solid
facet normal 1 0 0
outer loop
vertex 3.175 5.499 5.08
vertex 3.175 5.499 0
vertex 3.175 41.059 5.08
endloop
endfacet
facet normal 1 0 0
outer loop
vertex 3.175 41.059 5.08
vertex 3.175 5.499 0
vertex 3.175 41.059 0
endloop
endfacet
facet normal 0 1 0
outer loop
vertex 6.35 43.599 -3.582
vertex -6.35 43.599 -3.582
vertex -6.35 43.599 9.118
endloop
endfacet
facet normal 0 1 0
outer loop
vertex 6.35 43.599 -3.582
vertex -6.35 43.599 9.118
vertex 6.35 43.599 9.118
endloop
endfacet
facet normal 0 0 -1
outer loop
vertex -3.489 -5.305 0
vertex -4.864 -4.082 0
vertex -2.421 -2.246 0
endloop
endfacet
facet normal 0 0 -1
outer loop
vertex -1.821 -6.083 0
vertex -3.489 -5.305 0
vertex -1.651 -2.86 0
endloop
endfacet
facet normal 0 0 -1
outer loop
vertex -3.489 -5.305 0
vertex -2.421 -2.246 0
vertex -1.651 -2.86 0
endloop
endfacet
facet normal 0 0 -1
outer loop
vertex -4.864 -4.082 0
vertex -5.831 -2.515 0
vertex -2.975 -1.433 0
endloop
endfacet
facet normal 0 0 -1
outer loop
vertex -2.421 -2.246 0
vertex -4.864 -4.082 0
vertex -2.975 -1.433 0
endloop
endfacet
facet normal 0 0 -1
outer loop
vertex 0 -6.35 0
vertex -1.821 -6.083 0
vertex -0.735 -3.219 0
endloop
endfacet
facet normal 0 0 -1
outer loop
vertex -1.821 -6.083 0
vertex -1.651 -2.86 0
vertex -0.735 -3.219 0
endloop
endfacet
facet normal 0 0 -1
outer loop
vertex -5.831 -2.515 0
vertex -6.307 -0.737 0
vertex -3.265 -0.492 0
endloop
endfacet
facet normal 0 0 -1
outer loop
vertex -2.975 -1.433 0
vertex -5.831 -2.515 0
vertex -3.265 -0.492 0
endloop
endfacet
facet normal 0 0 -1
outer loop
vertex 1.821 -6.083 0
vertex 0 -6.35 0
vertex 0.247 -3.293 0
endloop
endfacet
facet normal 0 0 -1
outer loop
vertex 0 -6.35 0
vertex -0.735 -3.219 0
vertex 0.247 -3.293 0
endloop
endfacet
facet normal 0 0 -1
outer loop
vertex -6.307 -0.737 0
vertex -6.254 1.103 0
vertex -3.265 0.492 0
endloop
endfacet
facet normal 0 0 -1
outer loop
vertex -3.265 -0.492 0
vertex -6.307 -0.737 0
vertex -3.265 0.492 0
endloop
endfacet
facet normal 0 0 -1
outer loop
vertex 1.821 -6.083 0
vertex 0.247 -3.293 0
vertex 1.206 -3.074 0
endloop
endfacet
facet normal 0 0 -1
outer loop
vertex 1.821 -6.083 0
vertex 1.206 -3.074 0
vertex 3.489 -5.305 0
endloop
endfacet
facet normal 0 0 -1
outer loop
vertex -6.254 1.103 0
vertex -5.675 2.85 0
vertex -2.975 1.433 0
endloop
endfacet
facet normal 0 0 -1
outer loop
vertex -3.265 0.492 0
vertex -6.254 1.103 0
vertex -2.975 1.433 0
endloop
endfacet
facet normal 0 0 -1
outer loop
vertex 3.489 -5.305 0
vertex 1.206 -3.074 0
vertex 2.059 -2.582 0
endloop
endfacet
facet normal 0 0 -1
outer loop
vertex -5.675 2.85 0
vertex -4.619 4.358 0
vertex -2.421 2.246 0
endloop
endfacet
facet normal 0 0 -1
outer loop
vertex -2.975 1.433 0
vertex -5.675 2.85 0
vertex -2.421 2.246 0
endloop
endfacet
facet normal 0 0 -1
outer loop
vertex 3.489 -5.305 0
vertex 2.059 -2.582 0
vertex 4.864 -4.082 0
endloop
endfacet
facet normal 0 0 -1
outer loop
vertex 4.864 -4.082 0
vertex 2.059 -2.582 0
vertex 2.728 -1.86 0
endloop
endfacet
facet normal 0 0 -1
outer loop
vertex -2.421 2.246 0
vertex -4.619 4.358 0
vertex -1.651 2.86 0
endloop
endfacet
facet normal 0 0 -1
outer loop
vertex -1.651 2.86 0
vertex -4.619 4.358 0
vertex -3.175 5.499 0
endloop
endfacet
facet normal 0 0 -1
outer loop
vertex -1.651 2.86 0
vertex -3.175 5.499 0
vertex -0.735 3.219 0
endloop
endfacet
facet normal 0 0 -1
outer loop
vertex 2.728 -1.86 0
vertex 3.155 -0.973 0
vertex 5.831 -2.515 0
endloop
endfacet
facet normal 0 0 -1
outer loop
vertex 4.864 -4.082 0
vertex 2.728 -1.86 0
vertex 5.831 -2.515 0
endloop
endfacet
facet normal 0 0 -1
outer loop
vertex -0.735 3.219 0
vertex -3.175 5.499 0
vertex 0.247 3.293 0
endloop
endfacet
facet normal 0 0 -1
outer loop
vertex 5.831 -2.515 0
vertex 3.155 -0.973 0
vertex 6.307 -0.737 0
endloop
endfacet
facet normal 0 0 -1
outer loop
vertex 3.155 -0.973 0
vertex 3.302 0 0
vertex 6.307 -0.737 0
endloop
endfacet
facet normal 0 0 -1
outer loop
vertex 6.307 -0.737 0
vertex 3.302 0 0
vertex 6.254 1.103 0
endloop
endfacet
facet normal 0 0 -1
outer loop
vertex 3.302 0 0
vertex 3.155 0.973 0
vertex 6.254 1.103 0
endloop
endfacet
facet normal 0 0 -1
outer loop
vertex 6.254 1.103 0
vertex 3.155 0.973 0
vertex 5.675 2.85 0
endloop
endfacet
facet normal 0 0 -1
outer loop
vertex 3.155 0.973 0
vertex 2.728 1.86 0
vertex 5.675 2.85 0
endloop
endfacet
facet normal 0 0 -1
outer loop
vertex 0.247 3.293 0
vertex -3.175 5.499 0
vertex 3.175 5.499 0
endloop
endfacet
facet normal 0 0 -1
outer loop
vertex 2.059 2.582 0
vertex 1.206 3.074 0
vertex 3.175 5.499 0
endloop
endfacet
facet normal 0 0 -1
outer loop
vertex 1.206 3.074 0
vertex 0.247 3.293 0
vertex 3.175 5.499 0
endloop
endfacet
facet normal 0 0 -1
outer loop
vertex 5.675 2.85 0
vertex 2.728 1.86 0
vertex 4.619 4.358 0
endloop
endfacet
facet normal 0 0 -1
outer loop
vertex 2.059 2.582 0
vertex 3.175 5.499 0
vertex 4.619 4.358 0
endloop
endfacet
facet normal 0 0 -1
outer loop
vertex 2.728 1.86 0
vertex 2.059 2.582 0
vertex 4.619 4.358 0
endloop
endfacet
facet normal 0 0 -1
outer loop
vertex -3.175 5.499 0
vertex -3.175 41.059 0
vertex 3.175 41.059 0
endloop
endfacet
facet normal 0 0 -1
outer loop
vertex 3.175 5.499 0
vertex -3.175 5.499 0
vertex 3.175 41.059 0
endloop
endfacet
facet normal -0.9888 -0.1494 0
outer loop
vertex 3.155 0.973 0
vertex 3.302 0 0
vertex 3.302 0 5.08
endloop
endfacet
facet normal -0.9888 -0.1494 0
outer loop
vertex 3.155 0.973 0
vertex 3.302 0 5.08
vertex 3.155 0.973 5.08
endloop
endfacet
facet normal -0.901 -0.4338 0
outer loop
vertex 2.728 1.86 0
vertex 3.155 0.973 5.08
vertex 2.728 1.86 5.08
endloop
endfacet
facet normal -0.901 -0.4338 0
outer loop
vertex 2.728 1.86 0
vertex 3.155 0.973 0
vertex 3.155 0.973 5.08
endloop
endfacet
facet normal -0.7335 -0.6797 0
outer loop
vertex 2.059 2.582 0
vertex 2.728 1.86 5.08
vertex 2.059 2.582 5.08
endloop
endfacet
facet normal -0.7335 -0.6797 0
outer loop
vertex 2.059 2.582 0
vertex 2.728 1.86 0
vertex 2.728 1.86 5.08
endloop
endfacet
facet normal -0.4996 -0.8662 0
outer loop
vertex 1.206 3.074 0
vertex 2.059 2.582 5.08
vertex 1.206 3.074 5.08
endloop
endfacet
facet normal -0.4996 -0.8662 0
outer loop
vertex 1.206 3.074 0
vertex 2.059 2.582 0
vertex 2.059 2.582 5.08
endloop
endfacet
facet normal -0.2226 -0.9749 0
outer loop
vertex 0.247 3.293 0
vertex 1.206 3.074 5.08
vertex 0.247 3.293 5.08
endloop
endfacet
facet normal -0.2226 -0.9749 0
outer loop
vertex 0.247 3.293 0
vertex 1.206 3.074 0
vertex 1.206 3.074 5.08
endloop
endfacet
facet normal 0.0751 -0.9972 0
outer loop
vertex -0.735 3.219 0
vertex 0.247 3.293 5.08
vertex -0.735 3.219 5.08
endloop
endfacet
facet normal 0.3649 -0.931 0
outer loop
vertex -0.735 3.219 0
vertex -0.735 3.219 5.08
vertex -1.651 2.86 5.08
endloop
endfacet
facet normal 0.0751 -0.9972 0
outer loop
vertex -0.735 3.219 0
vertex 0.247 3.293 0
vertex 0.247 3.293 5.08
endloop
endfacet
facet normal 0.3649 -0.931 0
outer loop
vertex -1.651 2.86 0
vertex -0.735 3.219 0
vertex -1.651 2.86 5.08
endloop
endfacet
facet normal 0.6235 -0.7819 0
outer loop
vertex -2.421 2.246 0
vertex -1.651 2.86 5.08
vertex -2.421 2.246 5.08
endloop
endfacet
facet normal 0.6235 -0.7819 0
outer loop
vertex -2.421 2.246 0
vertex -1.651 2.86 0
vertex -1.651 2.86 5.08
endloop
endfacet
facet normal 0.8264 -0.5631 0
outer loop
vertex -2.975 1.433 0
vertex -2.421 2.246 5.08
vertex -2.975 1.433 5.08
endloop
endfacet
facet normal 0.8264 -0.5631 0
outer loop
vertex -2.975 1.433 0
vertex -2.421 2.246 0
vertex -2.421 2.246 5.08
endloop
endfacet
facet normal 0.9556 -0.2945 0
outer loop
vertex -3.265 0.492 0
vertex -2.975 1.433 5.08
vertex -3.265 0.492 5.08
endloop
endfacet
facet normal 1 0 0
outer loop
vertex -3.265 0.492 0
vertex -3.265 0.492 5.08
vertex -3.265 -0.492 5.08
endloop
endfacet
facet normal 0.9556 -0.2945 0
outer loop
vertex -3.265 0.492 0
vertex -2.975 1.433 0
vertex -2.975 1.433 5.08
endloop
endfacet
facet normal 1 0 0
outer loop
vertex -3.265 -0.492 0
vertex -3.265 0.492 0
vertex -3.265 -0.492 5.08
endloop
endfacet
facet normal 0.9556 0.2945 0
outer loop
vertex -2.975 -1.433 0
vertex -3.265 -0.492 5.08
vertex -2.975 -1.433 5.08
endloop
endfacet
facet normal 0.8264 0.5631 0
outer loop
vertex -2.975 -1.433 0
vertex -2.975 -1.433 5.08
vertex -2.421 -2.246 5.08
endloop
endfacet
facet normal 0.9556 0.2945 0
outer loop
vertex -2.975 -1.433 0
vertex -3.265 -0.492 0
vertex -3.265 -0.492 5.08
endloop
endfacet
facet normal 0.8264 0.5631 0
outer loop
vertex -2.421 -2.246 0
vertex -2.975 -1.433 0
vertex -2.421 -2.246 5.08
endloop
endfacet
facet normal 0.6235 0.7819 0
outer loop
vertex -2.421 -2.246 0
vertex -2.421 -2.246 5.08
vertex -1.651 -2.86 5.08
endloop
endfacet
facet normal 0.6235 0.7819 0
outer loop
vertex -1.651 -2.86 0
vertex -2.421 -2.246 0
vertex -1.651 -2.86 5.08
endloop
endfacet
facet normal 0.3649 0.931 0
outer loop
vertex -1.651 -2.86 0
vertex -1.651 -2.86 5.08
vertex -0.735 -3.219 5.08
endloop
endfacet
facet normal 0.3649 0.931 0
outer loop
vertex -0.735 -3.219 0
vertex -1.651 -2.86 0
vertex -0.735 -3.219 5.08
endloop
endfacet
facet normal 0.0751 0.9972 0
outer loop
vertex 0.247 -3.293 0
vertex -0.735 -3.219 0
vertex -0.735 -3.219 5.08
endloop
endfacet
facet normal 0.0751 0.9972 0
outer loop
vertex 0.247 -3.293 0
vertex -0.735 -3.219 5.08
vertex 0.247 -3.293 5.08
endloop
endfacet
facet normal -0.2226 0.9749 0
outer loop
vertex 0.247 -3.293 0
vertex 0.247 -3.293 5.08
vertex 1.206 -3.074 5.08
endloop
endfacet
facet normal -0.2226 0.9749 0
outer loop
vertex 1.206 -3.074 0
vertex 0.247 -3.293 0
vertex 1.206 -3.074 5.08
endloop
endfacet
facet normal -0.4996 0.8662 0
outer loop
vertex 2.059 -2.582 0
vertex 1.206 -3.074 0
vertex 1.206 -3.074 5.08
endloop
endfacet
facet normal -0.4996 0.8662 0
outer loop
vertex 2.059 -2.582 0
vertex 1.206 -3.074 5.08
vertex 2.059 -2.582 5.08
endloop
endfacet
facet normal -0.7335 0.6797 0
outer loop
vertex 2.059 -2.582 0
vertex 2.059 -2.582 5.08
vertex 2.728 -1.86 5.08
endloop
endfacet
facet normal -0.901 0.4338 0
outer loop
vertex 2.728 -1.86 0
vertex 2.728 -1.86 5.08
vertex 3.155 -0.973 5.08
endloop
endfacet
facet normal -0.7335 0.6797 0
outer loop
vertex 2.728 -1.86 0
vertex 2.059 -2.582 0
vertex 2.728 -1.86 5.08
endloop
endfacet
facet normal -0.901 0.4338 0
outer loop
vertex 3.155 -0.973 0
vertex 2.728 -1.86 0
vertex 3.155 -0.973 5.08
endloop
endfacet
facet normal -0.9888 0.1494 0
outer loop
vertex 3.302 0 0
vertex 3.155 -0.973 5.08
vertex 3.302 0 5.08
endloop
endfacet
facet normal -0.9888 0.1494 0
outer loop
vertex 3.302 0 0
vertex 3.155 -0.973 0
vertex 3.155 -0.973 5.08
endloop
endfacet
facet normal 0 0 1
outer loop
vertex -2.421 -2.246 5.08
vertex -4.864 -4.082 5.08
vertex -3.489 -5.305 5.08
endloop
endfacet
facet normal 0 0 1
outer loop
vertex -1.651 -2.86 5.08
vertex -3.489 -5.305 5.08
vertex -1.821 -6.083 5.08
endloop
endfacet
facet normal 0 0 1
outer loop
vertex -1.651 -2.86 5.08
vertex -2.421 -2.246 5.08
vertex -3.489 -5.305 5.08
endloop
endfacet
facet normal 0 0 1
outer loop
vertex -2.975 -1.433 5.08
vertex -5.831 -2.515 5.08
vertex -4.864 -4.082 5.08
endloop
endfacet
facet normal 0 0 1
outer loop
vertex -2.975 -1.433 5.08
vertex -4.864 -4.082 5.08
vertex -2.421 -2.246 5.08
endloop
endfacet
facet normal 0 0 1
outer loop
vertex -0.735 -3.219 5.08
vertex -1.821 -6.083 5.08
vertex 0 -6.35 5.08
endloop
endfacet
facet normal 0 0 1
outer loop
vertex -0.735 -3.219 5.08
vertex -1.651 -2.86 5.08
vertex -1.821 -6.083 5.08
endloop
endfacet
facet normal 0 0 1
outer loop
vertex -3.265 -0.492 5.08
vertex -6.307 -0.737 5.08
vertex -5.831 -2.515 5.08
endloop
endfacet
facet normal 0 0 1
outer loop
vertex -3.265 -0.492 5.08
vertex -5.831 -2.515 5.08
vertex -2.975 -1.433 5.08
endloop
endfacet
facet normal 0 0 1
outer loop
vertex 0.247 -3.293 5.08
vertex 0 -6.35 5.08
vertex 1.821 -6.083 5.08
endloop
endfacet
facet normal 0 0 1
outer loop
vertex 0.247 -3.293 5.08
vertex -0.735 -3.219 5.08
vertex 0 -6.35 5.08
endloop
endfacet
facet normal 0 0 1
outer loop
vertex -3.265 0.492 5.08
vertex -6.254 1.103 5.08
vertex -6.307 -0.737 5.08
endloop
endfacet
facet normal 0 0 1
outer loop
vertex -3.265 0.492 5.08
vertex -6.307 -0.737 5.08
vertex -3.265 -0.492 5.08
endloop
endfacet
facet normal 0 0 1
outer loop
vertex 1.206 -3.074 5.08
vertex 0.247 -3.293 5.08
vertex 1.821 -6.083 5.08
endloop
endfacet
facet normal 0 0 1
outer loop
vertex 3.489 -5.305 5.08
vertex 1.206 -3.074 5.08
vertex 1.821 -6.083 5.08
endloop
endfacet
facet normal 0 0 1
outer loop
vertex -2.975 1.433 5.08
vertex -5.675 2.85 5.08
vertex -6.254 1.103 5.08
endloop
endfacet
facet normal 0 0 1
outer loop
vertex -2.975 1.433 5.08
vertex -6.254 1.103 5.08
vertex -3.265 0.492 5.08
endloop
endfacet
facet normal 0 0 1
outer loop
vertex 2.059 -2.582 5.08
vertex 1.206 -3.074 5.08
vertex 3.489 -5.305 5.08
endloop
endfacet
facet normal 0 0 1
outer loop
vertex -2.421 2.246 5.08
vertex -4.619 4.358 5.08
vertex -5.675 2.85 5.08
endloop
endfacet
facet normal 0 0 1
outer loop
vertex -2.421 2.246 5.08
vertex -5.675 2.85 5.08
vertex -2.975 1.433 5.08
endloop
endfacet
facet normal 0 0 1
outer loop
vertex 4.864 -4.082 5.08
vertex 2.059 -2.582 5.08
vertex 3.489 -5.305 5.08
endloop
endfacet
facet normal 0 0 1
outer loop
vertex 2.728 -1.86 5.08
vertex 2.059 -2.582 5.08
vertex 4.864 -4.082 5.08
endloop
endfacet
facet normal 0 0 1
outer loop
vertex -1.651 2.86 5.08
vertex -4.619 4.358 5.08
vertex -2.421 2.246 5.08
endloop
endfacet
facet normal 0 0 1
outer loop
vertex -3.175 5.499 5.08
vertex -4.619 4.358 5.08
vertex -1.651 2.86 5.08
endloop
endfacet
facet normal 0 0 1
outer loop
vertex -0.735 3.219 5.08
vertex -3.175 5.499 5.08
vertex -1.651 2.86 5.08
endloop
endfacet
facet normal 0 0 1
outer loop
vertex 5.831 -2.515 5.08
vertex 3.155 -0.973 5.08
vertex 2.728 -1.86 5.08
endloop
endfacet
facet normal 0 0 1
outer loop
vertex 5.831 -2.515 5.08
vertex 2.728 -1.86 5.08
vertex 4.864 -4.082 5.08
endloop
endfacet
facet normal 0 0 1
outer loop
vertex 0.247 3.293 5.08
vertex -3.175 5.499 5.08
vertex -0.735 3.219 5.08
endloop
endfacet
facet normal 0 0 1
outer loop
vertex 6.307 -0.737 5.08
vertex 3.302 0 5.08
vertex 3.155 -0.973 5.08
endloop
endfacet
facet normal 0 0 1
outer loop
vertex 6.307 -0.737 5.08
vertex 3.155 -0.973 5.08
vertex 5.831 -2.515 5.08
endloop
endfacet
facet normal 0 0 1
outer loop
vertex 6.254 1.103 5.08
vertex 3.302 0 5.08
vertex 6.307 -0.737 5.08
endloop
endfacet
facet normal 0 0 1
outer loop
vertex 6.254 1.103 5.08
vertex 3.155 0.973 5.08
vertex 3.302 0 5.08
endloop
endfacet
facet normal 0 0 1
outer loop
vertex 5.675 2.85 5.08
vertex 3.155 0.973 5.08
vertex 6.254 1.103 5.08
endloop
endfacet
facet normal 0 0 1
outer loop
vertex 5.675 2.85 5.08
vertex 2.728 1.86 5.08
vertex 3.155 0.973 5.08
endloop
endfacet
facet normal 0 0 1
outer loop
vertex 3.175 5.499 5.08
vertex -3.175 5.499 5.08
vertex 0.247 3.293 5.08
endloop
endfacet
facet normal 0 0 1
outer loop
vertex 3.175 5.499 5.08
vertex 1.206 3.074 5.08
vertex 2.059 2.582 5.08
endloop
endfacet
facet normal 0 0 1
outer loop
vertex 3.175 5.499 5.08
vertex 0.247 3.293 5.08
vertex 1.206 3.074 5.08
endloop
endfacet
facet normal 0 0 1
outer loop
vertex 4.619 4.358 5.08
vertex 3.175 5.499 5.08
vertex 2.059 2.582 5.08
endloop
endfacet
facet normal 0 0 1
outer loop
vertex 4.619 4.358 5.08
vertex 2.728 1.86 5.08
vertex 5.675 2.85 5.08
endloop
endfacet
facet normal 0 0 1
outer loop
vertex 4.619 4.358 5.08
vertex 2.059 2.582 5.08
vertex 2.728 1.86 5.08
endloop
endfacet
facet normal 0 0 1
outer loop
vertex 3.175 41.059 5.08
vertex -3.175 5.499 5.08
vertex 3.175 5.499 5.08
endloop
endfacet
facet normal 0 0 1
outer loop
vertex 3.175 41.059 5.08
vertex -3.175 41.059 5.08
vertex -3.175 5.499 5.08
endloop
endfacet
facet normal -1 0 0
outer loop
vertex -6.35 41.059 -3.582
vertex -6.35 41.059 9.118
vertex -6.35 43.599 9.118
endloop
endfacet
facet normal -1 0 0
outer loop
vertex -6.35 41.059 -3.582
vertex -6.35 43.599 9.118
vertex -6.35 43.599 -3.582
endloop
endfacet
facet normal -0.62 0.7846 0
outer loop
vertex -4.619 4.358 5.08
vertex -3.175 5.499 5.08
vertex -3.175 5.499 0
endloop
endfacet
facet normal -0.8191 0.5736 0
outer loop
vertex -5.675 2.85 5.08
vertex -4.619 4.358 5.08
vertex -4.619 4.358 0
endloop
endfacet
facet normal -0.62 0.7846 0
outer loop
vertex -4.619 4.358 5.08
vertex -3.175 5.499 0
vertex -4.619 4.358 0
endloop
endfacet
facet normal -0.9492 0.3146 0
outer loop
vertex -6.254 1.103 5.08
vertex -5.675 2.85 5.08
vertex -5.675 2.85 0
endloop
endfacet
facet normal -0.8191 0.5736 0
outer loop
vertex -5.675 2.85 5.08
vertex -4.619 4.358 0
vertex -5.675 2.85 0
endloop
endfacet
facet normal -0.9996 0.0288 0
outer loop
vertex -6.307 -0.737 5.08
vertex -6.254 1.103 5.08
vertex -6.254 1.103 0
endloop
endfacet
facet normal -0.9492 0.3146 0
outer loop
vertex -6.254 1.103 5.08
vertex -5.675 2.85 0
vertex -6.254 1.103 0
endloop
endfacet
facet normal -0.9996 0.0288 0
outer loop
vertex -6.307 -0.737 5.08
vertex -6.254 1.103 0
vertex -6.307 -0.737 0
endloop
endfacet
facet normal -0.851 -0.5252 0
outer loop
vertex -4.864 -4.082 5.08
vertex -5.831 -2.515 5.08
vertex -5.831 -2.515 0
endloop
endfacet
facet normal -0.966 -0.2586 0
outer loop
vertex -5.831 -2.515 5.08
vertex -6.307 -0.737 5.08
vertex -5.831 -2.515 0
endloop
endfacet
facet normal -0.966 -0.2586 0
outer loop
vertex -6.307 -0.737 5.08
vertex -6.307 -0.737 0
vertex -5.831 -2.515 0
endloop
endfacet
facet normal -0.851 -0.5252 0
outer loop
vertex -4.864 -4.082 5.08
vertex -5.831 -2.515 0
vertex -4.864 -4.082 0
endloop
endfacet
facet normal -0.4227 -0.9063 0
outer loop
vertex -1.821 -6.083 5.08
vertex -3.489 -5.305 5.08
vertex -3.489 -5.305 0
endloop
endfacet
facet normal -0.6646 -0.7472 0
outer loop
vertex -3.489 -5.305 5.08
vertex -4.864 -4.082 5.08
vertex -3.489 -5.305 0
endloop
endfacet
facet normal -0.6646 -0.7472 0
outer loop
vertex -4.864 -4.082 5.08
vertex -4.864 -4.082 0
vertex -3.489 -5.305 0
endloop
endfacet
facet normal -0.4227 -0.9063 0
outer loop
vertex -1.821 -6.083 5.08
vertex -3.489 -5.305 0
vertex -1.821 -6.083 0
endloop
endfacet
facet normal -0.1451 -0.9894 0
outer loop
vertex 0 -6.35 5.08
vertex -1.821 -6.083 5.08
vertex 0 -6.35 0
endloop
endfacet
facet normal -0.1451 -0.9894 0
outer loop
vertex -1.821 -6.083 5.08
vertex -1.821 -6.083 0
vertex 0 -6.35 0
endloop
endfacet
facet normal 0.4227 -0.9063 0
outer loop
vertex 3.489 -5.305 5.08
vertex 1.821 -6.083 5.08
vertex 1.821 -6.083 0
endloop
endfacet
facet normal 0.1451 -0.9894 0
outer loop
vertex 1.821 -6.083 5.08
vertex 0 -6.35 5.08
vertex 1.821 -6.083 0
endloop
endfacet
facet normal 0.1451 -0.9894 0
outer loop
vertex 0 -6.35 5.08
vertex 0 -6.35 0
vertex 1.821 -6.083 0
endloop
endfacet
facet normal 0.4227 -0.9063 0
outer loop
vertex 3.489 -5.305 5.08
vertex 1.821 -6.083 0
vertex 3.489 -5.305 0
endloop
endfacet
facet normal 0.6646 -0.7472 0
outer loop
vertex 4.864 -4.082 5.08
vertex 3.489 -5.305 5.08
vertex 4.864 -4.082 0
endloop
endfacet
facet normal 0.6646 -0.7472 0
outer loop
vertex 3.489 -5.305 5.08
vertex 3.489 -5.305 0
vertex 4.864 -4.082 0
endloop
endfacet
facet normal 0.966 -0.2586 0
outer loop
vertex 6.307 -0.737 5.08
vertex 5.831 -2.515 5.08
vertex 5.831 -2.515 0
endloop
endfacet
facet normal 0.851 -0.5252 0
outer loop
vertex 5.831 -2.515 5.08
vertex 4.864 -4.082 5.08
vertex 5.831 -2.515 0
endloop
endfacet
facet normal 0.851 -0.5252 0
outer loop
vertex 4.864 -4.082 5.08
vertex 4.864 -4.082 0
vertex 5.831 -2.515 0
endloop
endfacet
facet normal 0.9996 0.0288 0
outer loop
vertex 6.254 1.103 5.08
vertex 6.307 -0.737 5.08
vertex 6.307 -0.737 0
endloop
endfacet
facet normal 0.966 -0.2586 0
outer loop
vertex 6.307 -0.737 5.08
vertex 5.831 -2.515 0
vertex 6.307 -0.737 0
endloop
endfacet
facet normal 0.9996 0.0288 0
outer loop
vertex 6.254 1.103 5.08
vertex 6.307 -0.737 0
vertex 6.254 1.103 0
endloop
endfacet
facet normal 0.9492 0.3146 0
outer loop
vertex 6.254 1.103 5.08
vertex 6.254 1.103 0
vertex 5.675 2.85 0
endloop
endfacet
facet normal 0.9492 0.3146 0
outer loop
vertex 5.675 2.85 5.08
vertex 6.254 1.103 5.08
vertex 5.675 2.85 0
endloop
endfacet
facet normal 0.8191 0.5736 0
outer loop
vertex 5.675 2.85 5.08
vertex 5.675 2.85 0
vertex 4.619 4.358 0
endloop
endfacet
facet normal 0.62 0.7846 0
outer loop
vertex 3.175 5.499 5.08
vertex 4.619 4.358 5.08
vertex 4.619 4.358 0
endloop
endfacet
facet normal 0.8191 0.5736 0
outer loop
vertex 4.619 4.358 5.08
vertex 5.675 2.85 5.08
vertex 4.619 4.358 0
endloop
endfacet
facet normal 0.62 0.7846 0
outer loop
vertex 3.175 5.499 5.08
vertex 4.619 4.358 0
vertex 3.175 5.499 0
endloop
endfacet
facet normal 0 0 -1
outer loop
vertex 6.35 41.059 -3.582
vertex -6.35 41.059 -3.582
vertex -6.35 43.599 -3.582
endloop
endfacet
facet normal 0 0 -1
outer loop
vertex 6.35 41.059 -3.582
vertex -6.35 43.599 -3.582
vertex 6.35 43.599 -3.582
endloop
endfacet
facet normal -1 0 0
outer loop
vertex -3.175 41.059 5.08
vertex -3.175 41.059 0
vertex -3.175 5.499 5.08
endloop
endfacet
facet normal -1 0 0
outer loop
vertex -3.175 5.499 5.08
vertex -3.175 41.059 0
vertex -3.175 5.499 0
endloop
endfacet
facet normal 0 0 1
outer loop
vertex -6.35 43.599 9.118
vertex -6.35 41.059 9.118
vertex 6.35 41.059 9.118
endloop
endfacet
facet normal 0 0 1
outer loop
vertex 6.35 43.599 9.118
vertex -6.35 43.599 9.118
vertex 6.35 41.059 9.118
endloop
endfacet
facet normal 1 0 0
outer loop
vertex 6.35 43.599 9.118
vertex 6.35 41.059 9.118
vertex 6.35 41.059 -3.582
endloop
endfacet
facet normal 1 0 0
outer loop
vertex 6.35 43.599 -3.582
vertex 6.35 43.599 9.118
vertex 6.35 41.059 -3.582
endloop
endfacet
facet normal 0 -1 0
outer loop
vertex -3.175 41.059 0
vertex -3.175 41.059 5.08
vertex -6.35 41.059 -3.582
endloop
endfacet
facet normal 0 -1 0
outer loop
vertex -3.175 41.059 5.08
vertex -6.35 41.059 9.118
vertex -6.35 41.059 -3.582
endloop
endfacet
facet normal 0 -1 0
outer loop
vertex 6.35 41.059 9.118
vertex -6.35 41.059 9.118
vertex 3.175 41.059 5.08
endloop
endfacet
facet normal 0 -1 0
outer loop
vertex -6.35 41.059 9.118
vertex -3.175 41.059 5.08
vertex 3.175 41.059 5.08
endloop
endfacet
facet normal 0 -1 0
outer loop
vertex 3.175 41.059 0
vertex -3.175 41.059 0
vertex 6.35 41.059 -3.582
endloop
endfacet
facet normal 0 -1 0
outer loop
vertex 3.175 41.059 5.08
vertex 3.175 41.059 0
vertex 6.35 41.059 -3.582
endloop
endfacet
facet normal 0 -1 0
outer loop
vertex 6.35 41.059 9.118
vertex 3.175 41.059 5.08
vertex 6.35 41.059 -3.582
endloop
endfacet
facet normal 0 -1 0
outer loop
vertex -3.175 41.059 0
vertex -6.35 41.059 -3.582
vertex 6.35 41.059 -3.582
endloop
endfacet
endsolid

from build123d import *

# Parameters (mm, degrees)
SKETCH1_R           = 6.35
SKETCH1_R_2         = 3.302
BOSS_EXTRUDE1_DEPTH = 5.08
SKETCH2_W           = 12.7
SKETCH2_H           = 12.7
BOSS_EXTRUDE2_DEPTH = 2.54


with BuildPart() as part:
    # Sketch1 → Boss-Extrude1 (new body)
    # profile 1 of 2: a face of its own
    with BuildSketch(Plane.XY):
        Circle(SKETCH1_R)
        Circle(SKETCH1_R_2, mode=Mode.SUBTRACT)
    # profile 2 of 2: a face of its own
    with BuildSketch(Plane.XY):
        with BuildLine():
            ThreePointArc((-3.175, 5.499261314), (0, 6.35), (3.175, 5.499261314))
            Line((3.175, 5.499261314), (3.175, 41.059261314))
            Line((3.175, 41.059261314), (-3.175, 41.059261314))
            Line((-3.175, 41.059261314), (-3.175, 5.499261314))
        make_face()
    extrude(amount=BOSS_EXTRUDE1_DEPTH)

    # Sketch2 → Boss-Extrude2 (add)
    with BuildSketch(Plane(origin=(0, 41.059261314, 0), x_dir=(1, 0, 0), z_dir=(0, 1, 0))):
        with Locations((0, -2.767803864)):
            Rectangle(SKETCH2_W, SKETCH2_H)
    extrude(amount=BOSS_EXTRUDE2_DEPTH)


solid = part.part
